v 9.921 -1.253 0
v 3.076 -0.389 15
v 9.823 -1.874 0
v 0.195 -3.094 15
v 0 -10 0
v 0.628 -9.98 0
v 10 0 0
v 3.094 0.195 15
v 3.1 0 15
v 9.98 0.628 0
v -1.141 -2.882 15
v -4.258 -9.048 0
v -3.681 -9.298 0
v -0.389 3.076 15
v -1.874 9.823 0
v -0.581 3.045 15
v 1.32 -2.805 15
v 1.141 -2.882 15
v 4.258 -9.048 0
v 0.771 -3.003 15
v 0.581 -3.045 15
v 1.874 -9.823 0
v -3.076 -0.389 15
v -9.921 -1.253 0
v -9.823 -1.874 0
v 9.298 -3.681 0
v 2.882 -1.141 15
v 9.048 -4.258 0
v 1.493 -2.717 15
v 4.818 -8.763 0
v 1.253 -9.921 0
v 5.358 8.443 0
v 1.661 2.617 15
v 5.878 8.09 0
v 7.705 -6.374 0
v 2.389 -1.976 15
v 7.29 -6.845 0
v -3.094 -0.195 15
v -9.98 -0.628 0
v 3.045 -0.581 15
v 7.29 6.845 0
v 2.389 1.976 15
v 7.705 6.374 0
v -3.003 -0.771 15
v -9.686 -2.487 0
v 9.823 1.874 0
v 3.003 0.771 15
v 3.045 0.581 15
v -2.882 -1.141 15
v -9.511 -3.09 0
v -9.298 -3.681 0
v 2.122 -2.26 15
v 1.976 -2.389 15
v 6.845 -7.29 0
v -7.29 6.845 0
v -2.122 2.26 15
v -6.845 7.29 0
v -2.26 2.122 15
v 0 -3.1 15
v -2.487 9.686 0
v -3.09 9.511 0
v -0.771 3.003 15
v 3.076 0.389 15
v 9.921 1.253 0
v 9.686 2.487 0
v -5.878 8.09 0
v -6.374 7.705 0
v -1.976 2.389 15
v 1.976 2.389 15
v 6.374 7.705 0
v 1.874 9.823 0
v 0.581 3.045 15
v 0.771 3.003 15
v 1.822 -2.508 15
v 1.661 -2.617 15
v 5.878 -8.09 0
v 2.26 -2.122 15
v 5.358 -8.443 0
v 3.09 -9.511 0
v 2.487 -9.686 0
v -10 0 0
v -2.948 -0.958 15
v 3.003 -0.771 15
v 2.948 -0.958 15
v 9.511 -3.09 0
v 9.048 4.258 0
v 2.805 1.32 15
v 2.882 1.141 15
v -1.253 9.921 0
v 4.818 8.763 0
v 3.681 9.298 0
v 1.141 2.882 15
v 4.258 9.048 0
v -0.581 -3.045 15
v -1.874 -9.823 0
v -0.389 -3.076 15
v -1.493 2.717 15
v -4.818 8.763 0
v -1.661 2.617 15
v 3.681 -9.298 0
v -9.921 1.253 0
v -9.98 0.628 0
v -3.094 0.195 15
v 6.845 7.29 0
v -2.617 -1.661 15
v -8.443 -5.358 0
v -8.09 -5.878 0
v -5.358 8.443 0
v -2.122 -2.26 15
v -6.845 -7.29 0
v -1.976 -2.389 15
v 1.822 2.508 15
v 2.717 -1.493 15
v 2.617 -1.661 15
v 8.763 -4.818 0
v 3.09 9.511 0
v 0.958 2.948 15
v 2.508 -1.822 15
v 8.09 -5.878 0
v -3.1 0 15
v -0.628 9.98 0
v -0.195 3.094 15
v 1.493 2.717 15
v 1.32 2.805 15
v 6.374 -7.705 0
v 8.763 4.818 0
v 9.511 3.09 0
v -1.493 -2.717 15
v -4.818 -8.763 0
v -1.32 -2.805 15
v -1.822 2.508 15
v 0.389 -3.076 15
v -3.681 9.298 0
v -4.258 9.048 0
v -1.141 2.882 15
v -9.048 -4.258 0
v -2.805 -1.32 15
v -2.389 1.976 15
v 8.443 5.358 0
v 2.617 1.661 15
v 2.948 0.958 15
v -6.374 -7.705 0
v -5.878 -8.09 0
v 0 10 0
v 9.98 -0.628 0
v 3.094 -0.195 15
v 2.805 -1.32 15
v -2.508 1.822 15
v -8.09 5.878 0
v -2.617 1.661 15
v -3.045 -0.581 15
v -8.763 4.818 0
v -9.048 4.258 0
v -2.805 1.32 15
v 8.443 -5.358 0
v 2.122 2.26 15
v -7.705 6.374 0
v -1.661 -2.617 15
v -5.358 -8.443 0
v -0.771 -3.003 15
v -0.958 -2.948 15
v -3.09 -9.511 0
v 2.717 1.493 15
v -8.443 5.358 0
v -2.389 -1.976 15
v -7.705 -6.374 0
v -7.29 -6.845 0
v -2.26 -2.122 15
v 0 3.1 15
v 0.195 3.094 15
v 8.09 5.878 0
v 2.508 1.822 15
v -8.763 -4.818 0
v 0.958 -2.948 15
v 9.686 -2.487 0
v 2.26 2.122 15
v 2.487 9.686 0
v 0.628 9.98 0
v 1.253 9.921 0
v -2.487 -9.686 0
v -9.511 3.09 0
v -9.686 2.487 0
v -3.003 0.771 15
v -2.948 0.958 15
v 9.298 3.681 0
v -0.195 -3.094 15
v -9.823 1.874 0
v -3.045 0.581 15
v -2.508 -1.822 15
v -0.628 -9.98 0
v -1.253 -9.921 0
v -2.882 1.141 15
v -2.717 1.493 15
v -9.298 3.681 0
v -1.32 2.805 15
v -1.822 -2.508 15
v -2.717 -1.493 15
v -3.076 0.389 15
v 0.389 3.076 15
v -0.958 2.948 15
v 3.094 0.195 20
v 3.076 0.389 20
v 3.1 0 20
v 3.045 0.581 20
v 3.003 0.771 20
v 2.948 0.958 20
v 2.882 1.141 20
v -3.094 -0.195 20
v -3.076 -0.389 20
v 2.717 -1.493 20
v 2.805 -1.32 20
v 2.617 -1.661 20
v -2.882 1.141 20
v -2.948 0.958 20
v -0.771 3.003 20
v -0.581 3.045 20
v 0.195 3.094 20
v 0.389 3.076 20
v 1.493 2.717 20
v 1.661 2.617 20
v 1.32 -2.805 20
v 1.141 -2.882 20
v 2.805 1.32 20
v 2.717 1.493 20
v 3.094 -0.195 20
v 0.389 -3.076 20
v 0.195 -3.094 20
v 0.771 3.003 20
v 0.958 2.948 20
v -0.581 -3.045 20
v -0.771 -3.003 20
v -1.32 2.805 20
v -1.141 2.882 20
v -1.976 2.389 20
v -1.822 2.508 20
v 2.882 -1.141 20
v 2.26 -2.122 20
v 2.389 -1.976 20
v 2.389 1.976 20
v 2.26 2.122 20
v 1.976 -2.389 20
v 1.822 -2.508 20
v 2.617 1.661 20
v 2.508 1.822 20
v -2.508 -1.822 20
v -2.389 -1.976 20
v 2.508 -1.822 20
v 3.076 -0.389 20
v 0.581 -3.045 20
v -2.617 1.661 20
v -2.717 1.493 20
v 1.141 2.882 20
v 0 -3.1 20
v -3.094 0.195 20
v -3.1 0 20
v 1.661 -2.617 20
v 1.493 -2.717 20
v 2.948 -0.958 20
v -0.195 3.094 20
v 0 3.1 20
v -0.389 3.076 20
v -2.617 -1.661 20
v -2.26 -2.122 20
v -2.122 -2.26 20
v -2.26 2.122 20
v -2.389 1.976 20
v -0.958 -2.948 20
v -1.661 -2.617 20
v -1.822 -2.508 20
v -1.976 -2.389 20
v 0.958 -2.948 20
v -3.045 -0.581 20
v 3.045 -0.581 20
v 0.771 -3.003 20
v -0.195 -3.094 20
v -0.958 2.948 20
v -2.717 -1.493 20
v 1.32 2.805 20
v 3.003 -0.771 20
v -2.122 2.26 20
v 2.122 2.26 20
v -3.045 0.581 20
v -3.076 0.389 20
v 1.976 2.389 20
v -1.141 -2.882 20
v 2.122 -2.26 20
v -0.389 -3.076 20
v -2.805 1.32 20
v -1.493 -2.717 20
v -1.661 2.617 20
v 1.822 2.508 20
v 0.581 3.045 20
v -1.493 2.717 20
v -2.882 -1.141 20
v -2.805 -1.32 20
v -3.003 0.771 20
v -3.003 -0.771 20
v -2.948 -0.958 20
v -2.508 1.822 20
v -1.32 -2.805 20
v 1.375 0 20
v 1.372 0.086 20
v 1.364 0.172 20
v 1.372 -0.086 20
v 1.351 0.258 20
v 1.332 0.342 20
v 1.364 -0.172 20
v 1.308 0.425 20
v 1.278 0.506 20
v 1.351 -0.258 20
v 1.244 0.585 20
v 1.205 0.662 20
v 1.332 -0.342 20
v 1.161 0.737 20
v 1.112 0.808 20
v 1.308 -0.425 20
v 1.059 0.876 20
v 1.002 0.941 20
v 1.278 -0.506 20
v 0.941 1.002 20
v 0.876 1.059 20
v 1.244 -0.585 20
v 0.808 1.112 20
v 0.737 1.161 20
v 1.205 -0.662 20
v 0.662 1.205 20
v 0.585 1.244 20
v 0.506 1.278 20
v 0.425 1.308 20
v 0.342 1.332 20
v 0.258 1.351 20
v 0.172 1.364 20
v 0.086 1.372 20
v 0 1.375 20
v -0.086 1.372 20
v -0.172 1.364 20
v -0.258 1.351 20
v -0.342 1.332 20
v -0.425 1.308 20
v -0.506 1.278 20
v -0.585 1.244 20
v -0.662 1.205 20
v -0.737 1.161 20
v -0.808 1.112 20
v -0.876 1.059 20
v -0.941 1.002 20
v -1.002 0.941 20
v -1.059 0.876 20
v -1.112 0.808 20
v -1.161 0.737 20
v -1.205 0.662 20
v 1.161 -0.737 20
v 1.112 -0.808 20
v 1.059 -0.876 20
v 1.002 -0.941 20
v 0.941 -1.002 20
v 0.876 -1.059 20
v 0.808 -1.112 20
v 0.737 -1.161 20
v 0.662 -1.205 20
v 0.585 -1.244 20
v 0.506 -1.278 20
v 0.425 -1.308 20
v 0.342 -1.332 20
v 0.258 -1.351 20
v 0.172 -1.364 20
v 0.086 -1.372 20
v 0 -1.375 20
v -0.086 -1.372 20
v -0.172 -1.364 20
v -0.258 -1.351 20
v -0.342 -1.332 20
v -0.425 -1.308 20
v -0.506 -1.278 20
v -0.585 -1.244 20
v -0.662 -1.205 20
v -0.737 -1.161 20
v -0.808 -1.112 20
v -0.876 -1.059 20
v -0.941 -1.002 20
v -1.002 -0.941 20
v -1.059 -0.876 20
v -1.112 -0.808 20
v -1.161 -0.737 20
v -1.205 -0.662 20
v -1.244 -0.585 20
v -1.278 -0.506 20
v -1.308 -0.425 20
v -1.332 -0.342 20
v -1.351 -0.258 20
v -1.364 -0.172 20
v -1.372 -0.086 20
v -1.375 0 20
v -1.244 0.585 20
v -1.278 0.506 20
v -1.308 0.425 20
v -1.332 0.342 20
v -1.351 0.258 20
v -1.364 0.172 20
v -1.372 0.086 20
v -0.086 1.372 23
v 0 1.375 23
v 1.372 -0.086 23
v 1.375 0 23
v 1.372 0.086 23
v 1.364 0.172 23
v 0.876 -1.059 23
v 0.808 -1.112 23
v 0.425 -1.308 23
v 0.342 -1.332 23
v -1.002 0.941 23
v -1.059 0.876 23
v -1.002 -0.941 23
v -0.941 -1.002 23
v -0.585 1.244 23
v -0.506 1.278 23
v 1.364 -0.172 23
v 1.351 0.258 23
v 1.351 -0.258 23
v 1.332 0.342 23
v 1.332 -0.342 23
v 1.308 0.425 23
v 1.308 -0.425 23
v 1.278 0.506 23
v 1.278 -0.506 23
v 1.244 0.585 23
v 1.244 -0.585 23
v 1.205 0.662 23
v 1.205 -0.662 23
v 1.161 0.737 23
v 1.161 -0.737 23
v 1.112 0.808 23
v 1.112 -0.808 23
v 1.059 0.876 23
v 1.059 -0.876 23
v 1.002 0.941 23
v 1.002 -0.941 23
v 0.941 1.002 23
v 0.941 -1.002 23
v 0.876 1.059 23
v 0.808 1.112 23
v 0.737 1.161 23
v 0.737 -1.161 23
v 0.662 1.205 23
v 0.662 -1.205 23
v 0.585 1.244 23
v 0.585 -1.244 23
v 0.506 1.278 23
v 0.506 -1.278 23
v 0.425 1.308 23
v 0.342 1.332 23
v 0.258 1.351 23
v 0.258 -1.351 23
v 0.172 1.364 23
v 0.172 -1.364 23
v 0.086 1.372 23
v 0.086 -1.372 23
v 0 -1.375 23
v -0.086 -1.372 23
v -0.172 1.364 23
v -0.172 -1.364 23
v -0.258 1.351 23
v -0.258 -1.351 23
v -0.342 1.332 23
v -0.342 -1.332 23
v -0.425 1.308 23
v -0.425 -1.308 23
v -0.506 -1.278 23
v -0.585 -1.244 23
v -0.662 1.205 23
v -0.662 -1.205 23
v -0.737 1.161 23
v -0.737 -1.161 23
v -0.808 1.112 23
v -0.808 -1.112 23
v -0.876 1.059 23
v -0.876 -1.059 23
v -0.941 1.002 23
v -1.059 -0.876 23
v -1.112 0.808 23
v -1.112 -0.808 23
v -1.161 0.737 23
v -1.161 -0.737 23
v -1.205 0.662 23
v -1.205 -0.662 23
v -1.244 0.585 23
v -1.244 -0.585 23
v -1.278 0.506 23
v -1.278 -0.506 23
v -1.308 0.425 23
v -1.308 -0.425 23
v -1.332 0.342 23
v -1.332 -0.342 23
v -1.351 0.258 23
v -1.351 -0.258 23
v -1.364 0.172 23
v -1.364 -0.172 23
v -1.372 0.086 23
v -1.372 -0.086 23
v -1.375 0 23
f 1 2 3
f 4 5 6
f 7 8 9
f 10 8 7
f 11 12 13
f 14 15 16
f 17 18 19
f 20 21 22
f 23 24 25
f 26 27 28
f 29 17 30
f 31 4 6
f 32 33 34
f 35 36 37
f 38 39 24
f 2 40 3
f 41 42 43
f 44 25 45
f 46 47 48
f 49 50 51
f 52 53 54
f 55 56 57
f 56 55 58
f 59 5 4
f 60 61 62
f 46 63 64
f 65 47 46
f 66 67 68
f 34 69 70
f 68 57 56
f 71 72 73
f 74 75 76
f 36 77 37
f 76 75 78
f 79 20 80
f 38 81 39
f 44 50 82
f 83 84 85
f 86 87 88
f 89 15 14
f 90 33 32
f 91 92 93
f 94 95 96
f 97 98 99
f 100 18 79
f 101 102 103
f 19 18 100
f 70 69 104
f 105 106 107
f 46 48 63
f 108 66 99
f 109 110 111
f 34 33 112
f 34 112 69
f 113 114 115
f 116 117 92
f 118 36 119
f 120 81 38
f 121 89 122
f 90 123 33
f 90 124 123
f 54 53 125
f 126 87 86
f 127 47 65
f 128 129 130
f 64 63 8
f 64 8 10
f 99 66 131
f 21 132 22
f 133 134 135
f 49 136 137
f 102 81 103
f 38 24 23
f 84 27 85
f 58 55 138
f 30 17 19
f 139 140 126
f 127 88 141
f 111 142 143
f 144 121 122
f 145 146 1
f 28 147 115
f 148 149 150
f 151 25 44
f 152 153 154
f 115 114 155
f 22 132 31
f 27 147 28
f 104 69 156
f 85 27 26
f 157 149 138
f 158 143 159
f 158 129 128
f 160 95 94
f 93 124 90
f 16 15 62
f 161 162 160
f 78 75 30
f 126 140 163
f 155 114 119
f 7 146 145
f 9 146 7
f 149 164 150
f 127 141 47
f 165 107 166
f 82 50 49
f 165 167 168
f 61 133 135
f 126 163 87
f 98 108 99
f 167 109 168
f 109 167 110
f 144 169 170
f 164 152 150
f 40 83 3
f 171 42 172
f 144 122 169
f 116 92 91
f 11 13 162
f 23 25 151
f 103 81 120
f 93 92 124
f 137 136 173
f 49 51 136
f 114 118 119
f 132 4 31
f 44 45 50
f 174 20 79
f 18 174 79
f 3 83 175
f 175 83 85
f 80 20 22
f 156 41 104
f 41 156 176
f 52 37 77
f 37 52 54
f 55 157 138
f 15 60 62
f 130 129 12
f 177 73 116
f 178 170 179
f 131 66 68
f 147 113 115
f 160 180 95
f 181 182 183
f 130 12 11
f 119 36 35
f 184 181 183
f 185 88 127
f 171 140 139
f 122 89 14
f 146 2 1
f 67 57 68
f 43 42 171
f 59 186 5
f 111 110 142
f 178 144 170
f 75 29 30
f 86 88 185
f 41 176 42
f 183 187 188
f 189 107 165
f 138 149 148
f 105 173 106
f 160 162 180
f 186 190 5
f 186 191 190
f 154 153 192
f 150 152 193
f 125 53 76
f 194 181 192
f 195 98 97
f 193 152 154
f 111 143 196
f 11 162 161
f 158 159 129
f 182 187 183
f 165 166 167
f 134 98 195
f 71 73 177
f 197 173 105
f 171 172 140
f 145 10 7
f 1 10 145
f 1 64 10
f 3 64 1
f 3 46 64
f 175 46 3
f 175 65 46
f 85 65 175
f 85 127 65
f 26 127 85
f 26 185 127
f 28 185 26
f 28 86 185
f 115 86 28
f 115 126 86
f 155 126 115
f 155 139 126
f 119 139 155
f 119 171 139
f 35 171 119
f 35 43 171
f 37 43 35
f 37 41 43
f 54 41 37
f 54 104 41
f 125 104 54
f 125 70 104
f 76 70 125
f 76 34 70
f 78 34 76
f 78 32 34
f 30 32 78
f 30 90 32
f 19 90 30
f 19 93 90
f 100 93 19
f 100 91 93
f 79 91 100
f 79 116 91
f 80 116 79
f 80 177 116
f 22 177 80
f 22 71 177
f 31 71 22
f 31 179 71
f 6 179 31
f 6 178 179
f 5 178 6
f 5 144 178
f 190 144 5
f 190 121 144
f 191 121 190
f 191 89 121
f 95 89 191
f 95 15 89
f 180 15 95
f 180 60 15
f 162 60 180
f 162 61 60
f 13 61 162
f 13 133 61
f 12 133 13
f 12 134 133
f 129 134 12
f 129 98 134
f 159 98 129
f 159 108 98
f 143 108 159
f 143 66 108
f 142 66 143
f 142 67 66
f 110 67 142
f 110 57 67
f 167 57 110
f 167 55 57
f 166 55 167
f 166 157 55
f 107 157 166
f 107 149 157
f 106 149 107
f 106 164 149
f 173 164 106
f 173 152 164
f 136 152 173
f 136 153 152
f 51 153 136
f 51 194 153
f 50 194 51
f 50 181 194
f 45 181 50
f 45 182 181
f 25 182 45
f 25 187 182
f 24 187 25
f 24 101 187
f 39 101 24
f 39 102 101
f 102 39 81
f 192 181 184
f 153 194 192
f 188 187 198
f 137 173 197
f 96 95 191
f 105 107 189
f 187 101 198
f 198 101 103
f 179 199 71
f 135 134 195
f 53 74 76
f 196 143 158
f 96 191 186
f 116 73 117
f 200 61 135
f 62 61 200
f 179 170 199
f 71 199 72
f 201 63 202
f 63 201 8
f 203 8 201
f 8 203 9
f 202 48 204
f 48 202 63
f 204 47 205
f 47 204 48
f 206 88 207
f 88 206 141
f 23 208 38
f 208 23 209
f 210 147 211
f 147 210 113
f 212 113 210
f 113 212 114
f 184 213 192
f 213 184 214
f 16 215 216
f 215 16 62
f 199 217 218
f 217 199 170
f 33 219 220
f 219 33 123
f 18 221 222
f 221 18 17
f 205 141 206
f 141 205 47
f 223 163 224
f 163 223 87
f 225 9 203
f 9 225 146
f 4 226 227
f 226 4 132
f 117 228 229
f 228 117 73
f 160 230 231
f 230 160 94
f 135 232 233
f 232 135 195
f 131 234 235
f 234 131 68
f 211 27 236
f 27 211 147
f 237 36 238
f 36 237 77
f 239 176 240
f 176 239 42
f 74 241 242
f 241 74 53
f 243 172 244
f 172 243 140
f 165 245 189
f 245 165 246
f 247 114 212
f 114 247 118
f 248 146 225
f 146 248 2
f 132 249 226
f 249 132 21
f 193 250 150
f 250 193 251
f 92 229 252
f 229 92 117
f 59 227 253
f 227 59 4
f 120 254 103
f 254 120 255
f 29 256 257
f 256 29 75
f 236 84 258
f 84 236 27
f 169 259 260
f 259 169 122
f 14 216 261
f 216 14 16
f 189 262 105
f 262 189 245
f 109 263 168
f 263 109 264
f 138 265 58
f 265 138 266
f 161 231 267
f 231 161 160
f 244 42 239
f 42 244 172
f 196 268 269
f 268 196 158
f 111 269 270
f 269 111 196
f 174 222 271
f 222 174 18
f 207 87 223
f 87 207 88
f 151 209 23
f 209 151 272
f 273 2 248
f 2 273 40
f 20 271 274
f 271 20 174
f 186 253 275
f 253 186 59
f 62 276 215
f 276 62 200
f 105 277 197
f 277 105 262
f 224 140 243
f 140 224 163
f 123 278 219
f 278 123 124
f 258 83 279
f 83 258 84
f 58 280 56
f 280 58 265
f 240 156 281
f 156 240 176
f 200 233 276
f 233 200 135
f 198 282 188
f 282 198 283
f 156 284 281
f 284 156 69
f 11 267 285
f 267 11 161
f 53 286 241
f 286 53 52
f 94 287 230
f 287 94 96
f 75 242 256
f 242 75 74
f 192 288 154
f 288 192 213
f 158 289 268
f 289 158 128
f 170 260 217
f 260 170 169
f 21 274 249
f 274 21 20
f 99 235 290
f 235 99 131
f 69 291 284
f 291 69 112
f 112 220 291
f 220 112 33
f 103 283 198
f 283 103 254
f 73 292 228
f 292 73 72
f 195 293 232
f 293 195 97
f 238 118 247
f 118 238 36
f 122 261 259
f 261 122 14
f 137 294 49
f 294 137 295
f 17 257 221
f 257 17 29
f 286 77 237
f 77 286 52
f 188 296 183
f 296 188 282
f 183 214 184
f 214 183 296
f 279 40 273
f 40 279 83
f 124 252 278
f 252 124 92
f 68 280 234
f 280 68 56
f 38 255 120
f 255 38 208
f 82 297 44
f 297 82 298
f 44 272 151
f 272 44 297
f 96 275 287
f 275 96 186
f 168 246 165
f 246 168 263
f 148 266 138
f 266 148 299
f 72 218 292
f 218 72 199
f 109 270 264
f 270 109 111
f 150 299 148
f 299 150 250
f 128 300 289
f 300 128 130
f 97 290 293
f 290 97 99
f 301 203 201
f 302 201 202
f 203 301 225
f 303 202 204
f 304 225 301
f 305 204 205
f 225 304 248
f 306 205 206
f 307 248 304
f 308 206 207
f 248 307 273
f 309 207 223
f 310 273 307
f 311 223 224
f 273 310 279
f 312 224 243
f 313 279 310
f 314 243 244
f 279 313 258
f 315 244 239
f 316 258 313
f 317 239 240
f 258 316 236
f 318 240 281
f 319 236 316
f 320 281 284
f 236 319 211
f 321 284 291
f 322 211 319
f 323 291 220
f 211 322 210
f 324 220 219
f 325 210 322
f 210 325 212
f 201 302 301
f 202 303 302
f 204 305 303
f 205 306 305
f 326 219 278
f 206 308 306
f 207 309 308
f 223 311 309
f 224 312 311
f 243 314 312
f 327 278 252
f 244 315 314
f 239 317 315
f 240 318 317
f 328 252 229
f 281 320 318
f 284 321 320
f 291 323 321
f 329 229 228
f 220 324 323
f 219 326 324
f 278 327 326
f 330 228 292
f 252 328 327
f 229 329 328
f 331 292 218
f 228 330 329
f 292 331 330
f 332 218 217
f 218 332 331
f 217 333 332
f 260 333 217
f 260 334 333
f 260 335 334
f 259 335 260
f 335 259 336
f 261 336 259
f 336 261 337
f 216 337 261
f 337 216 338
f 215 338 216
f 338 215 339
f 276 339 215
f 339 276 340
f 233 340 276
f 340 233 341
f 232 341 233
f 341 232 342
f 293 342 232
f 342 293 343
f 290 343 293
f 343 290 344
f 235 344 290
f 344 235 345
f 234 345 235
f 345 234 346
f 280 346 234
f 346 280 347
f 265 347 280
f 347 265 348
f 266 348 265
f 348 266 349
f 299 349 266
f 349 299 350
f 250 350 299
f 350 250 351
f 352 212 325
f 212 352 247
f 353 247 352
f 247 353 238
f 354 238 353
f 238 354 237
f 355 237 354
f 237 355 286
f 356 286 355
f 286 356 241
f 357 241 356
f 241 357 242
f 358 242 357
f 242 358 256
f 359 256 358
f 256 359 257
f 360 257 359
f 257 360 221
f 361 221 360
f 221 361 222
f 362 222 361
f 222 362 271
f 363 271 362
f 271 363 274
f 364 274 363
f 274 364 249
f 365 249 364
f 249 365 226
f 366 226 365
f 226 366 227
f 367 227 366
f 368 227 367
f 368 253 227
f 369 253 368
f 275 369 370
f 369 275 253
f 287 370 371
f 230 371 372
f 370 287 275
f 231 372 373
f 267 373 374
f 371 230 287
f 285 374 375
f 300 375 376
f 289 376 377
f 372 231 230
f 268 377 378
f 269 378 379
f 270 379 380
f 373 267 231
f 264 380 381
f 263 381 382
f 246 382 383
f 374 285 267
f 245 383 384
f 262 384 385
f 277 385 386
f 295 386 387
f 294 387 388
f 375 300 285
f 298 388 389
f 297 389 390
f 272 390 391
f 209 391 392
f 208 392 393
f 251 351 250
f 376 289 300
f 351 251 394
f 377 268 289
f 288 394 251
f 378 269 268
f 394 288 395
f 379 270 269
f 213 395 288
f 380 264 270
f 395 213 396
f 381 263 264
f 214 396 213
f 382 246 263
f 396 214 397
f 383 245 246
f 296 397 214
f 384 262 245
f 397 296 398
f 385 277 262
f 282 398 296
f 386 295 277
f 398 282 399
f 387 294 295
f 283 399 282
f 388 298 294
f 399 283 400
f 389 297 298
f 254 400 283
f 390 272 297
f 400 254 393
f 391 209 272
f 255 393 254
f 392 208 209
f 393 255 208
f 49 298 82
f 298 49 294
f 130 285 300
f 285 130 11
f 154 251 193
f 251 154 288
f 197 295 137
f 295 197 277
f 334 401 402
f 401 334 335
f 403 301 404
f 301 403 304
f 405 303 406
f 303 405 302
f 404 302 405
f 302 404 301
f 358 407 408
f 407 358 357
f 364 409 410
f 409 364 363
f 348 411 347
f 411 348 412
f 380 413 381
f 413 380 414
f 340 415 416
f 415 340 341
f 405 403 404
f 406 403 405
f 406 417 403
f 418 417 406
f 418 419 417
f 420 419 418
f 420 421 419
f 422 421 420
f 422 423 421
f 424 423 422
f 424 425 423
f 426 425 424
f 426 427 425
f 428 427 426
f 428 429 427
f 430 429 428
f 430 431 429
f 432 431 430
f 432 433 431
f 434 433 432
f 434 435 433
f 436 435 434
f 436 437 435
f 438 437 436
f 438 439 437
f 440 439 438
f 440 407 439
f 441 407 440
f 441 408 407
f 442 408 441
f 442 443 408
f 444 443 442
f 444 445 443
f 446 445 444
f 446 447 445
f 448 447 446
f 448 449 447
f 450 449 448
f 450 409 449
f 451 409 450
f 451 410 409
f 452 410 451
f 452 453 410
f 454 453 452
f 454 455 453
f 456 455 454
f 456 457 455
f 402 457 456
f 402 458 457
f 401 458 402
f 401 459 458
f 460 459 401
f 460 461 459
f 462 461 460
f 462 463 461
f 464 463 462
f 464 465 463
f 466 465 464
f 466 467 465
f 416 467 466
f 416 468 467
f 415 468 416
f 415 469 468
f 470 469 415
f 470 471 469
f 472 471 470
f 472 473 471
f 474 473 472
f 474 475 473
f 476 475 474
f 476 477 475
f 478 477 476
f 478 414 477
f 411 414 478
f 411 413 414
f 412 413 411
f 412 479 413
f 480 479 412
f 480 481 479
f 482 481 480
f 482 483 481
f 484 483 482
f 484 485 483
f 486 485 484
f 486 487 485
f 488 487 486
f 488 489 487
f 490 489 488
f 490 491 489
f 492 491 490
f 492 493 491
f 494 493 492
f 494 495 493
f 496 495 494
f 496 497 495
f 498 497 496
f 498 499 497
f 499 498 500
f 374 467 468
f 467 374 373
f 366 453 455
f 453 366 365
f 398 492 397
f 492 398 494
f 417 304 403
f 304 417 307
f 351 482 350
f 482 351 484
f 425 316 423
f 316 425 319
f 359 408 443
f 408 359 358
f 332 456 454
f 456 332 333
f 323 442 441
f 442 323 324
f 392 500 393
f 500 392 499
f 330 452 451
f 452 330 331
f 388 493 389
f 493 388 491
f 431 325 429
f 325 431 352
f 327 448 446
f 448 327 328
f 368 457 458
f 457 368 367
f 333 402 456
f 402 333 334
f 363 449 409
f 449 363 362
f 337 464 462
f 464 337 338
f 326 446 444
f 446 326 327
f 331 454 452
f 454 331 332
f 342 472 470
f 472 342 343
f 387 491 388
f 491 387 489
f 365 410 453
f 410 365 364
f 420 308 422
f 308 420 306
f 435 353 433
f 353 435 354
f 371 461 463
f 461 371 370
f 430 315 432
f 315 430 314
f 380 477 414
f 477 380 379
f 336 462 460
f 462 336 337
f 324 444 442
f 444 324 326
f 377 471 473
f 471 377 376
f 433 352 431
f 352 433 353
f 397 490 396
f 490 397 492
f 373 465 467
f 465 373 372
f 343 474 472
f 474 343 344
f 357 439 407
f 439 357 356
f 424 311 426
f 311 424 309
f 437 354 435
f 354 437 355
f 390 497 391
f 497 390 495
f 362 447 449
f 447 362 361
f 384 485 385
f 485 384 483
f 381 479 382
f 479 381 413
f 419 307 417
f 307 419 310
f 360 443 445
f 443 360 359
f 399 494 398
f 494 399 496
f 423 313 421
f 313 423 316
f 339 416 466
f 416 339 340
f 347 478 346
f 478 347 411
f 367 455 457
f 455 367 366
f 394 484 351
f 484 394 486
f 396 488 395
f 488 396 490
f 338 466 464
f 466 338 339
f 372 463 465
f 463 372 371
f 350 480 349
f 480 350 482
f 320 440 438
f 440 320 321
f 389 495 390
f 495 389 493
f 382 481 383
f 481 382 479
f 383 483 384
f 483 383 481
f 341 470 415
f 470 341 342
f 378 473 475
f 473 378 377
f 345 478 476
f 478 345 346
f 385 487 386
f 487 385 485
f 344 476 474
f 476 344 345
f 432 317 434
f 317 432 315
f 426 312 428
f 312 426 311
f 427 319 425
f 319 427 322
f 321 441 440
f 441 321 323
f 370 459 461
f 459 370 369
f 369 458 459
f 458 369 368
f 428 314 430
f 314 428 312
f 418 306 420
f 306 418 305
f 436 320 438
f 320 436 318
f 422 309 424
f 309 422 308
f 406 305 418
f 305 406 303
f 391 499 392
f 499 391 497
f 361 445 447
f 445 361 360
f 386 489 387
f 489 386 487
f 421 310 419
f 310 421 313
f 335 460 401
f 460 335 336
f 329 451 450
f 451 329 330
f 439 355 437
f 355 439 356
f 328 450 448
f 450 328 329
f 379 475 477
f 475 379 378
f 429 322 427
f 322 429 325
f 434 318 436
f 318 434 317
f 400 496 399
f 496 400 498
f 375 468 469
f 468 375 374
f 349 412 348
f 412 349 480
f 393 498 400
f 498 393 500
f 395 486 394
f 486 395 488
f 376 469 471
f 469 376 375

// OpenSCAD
pegDia = 2.75;
pegHeight = 3;
stopDia = 6.2;
stopHeight = 5;
baseDia = 20;
baseHeight = 15;
$fn = 100;

module pin() {
    
    // Base Cone
    cylinder(h=baseHeight, r1=(baseDia/2), r2=(stopDia/2));
    
    // Stopper that Rpi rests on
    translate([0,0,baseHeight]) {
        cylinder(h=stopHeight, r=(stopDia/2));
    }
    
    // Mounting hole peg
    translate([0,0,baseHeight+stopHeight]) {
        cylinder(h=pegHeight, r=(pegDia/2));
    }
    
}

pin();
